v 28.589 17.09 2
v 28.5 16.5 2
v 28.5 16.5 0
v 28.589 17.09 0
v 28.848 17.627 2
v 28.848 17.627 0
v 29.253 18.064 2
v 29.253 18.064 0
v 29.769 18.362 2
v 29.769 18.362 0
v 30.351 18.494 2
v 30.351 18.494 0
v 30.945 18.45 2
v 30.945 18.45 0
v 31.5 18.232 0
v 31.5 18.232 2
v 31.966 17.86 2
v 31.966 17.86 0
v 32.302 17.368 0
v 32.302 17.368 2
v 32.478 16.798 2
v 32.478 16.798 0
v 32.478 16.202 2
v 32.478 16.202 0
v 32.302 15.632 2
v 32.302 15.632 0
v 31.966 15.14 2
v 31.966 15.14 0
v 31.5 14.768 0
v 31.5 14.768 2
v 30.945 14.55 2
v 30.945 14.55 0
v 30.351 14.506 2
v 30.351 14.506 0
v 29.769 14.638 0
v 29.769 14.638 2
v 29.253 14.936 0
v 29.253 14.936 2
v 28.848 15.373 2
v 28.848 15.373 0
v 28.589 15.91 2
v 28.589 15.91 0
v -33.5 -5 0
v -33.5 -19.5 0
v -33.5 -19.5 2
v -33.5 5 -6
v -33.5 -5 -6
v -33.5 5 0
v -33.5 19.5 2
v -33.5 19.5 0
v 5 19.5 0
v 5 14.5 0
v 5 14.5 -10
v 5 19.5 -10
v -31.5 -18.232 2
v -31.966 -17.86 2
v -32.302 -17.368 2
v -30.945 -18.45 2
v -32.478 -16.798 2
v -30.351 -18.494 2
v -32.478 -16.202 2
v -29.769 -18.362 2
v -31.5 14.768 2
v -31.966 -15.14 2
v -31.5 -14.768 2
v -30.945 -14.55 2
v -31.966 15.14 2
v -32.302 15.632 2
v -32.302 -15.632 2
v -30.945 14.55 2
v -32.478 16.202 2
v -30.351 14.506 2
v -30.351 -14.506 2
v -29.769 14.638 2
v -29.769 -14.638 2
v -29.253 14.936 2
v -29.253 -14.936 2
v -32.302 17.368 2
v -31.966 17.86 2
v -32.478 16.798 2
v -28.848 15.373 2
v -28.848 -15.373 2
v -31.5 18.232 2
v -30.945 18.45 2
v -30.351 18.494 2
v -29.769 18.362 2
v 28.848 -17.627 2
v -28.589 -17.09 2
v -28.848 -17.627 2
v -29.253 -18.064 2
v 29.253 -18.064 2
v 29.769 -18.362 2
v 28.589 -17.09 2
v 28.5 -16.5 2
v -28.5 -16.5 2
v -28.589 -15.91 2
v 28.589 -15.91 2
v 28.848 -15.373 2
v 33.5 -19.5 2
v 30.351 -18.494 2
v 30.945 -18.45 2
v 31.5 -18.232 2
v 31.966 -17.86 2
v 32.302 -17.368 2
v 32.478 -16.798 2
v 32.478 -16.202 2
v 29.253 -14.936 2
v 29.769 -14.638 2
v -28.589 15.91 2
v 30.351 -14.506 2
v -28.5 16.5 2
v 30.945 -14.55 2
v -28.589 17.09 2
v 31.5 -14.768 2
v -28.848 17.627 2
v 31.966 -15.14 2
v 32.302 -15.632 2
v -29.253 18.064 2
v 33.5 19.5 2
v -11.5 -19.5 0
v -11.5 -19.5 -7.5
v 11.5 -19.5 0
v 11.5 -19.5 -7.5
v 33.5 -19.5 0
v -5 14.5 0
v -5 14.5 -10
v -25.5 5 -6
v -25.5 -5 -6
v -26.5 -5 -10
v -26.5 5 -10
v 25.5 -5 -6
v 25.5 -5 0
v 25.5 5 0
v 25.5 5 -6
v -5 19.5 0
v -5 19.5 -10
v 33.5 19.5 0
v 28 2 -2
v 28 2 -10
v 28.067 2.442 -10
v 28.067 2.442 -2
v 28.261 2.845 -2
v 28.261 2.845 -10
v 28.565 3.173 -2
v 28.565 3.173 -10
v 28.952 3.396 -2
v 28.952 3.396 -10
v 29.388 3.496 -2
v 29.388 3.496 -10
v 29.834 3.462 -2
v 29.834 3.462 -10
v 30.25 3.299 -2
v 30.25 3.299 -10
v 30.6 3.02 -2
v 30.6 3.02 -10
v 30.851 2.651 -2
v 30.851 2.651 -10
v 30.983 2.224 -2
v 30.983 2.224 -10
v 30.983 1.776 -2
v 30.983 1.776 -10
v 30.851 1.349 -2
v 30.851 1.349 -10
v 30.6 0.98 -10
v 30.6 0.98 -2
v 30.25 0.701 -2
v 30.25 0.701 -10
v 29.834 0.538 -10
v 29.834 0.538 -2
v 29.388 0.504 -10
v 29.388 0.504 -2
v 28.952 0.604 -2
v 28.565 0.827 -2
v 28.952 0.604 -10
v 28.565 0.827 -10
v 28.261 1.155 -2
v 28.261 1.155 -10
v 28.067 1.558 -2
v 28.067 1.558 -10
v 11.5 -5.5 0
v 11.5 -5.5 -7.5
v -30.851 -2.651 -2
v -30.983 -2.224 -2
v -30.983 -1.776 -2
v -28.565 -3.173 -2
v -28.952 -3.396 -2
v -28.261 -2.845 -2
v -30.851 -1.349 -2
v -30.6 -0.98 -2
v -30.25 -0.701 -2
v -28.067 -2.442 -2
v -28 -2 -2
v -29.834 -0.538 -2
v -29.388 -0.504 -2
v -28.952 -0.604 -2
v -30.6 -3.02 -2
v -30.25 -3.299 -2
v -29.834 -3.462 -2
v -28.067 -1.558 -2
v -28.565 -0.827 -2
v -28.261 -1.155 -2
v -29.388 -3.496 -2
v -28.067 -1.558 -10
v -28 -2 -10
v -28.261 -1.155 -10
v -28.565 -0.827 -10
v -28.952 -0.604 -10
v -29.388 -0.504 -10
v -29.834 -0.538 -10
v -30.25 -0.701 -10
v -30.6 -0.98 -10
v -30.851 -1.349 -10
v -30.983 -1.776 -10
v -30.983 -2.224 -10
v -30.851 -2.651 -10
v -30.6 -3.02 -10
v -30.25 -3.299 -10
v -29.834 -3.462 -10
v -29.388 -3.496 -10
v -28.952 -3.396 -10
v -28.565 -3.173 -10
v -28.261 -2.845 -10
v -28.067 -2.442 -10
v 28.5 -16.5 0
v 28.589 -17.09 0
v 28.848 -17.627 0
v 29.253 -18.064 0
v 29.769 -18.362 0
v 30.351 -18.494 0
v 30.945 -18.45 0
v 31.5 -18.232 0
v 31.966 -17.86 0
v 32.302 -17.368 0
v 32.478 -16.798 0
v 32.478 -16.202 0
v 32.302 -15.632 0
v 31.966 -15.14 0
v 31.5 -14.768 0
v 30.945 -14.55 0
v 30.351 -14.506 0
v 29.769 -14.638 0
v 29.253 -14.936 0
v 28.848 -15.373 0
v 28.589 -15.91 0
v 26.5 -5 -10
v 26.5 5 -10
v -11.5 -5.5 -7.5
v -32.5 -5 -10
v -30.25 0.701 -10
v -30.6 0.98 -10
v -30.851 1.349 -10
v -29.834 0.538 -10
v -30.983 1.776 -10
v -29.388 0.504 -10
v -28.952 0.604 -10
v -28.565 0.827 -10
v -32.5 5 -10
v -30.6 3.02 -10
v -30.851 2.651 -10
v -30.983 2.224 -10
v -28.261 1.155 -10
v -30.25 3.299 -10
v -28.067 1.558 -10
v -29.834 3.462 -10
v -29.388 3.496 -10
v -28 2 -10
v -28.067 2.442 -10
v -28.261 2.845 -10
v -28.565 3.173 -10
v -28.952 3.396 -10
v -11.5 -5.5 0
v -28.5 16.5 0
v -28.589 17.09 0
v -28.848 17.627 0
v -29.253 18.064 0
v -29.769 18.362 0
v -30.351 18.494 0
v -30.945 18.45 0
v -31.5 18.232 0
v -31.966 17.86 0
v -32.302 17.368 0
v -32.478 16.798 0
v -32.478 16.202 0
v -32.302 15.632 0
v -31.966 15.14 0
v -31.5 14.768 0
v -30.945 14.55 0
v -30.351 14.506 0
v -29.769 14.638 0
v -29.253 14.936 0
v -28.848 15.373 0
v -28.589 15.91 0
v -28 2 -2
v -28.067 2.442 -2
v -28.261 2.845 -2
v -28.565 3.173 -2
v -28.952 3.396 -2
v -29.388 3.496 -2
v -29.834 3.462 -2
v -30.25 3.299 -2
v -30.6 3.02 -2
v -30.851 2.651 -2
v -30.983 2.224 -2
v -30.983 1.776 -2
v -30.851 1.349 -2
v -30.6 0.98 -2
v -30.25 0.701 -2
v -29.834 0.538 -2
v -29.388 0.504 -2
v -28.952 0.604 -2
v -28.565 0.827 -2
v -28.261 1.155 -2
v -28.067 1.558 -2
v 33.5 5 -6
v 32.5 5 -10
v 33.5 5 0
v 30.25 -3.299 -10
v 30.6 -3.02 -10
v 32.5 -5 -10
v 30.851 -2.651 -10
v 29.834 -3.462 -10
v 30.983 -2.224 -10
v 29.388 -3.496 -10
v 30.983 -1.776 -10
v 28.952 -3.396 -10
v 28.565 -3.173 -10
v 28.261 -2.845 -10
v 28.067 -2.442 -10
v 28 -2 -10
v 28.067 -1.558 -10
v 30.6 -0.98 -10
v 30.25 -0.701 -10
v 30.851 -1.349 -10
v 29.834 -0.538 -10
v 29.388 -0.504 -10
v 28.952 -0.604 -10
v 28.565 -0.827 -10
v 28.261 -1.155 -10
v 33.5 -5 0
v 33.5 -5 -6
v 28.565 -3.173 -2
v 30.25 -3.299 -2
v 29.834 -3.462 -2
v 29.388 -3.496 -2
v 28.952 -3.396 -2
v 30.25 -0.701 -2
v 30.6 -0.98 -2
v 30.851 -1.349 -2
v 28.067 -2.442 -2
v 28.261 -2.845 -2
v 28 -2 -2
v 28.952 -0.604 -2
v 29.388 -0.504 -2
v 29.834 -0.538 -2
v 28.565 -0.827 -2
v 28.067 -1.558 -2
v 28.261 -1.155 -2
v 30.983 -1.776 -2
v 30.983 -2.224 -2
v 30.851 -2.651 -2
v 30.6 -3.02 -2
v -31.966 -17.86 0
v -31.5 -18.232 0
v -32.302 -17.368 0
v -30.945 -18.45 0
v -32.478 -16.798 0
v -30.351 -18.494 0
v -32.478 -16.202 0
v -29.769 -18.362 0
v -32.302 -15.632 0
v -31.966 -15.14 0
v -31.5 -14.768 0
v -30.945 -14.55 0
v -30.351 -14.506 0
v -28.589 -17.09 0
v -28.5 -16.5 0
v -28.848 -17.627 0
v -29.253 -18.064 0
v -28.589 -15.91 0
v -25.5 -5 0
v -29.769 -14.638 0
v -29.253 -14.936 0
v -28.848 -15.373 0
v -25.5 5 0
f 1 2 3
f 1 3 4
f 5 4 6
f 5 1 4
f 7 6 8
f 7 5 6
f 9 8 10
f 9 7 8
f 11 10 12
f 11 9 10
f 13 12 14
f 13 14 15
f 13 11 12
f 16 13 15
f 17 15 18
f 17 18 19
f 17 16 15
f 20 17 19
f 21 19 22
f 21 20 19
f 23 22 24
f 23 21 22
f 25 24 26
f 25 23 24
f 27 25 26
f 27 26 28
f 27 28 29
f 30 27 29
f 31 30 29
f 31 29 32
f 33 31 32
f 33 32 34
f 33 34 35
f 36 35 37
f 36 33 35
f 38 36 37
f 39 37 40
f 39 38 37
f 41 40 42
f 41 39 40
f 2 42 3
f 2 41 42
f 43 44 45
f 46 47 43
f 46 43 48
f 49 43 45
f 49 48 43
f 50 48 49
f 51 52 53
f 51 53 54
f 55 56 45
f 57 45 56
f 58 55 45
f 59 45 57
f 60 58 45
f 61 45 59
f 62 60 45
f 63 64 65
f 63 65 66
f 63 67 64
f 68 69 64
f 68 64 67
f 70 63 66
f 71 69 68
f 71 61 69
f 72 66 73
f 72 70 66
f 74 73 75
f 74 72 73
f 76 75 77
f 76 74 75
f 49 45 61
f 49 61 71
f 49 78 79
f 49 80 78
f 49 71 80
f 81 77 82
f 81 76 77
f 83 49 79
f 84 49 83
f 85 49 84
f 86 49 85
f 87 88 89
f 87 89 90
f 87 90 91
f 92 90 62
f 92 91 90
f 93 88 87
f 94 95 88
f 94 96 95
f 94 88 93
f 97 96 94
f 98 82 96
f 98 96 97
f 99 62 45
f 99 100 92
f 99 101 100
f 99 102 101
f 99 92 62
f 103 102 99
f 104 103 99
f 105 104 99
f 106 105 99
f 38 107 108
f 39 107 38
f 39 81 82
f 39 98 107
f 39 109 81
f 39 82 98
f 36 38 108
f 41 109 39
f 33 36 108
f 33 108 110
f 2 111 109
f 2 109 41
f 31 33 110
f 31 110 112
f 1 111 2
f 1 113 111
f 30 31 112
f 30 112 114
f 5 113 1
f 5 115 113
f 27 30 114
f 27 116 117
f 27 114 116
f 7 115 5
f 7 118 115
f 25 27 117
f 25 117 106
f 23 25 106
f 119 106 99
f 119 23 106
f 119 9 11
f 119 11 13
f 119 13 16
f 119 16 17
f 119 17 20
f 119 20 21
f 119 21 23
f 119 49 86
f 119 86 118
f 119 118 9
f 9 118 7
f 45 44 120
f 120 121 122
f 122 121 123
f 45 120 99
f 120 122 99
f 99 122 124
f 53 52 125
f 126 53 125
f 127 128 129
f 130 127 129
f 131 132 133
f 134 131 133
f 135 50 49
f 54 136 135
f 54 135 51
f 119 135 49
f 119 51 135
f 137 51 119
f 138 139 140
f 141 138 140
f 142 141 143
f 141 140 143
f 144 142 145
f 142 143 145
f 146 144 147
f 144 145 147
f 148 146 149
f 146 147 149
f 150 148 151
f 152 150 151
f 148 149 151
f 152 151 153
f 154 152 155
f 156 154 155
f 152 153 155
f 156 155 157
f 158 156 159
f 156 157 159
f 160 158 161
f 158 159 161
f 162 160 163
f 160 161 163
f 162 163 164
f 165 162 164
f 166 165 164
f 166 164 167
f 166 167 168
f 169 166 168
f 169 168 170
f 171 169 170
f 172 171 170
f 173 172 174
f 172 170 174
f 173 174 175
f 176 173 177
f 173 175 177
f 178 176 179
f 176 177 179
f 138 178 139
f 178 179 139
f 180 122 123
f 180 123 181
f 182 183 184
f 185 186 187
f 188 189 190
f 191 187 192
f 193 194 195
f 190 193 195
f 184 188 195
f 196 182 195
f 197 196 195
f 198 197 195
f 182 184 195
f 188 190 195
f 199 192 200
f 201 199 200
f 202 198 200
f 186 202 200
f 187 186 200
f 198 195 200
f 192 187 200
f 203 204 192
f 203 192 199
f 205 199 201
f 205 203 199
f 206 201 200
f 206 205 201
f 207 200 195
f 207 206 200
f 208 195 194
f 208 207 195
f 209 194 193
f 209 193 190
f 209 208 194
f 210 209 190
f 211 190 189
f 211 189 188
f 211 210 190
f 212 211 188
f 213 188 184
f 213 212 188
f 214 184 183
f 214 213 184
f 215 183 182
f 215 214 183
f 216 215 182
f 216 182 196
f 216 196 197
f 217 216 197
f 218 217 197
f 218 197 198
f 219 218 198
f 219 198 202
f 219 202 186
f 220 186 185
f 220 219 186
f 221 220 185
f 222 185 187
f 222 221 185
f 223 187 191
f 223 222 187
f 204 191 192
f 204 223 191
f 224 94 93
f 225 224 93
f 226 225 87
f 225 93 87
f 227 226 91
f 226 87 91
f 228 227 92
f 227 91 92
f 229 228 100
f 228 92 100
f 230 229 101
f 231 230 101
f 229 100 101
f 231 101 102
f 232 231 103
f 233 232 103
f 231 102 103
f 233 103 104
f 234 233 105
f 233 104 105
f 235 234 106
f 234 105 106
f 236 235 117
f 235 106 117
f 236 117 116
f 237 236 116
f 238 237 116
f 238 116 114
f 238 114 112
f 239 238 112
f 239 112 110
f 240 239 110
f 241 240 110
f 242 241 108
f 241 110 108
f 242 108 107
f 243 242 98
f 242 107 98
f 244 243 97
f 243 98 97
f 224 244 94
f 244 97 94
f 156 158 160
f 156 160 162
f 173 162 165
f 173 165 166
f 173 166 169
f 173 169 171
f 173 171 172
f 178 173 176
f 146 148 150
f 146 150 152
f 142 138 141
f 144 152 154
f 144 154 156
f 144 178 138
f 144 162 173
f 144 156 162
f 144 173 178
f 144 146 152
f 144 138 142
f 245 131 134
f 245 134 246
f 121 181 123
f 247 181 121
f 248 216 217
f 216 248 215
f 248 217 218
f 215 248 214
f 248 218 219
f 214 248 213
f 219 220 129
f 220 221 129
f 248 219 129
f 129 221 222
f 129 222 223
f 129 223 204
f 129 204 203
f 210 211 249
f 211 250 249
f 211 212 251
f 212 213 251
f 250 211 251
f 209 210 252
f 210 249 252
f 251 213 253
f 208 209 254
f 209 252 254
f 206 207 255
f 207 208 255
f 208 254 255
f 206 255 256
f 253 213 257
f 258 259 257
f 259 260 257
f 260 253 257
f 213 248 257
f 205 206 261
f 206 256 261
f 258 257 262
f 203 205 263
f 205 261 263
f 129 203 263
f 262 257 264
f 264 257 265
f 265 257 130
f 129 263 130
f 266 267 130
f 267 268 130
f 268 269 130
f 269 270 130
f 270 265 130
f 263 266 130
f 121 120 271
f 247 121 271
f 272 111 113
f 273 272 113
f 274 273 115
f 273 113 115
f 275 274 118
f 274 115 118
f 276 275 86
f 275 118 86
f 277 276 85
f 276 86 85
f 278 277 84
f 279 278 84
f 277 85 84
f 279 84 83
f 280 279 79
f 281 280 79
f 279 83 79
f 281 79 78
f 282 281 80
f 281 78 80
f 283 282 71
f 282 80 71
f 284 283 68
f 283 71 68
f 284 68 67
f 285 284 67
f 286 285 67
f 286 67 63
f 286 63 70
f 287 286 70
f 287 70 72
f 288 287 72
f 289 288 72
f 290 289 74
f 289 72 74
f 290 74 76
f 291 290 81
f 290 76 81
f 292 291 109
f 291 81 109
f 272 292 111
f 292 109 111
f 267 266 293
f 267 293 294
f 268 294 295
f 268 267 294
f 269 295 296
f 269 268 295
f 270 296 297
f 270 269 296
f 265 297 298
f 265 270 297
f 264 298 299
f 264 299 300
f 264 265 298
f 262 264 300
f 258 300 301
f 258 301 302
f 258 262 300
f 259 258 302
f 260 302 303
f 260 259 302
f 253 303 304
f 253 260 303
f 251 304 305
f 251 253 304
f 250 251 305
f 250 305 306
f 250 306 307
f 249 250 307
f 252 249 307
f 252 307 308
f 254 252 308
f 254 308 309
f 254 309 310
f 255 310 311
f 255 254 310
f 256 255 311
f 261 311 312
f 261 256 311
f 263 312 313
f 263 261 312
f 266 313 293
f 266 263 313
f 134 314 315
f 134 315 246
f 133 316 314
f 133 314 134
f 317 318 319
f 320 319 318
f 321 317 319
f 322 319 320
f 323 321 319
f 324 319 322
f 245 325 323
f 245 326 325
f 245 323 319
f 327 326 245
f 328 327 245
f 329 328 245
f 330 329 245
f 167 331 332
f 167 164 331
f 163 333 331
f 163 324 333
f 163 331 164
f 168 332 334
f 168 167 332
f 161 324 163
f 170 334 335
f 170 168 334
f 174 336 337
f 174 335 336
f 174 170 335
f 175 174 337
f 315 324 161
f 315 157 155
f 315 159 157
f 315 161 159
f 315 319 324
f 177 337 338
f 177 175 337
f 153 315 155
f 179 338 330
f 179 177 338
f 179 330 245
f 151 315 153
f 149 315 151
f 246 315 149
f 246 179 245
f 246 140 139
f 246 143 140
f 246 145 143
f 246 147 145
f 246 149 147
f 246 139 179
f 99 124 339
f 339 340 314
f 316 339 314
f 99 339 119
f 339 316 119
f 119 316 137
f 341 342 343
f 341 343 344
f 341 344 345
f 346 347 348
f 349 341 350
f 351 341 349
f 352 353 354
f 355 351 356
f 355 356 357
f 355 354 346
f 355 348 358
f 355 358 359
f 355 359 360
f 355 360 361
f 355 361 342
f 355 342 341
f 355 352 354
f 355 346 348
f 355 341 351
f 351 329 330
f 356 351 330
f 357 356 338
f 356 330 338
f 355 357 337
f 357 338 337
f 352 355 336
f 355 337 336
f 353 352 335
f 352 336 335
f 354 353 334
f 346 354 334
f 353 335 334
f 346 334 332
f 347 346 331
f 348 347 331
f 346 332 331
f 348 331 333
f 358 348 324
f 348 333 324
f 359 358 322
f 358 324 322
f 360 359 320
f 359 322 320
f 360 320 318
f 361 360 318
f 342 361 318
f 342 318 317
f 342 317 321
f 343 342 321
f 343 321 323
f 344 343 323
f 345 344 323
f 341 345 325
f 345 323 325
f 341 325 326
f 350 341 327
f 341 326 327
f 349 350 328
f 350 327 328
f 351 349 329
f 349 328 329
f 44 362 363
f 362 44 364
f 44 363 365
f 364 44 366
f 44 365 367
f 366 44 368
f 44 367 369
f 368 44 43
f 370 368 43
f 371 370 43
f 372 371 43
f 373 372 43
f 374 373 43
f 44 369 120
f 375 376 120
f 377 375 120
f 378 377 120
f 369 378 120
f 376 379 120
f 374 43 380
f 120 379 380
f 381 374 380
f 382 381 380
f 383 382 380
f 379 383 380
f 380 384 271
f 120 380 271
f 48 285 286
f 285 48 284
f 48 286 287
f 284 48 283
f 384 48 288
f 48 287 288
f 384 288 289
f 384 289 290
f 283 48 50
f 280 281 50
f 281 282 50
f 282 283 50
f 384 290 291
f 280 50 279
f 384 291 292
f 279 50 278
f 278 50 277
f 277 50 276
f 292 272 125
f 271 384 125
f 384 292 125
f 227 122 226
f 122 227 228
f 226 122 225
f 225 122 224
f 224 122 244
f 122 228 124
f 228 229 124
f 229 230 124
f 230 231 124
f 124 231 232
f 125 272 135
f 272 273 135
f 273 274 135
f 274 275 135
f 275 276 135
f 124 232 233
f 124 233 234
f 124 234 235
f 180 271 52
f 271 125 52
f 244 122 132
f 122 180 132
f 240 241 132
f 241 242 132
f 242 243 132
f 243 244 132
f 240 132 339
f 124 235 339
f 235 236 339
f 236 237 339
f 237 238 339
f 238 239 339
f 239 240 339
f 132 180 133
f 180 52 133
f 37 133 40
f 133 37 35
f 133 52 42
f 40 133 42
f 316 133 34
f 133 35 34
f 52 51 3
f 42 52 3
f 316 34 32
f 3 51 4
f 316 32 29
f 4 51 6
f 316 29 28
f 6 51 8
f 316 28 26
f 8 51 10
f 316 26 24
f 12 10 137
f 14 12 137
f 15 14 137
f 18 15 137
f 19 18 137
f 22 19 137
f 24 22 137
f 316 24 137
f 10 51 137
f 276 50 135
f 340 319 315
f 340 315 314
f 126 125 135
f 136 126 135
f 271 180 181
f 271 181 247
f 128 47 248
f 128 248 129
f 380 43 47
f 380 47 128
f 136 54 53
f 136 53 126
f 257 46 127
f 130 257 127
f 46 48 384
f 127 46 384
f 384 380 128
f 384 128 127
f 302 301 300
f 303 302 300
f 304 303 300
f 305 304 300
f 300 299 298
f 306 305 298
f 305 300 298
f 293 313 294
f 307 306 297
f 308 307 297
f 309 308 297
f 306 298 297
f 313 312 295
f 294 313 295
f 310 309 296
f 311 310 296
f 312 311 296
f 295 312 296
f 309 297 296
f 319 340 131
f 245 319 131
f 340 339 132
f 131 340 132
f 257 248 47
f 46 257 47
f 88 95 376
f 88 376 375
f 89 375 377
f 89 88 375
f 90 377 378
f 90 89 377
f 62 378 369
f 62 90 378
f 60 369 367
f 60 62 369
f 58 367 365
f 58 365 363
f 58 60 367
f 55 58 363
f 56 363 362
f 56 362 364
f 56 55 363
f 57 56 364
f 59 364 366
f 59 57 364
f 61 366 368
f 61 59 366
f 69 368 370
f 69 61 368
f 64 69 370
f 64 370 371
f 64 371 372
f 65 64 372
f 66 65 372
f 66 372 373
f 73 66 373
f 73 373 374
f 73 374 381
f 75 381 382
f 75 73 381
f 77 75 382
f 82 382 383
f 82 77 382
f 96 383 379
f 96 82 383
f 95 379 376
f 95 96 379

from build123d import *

# Parameters (mm, degrees)
SKETCH_1_W               = 67
SKETCH_1_H               = 39
EXTRUDE_1_DEPTH          = 2
SKETCH_2_R               = 2
CUT_EXTRUDE_1_DEPTH      = 2
MIRROR_2_COPY_1_SKETCH_R = 2
MIRROR_2_COPY_1_DEPTH    = 2
SKETCH_3_W               = 8
SKETCH_3_H               = 10
EXTRUDE_2_DEPTH          = 10
CUT_EXTRUDE_2_DEPTH      = 10
SKETCH_5_R               = 1.5
CUT_EXTRUDE_3_DEPTH      = 8
SKETCH_6_W               = 10
SKETCH_6_H               = 5
EXTRUDE_3_DEPTH          = 10
SKETCH_10_W              = 23
SKETCH_10_H              = 14
EXTRUDE_4_DEPTH          = 7.5


with BuildPart() as part:
    # 草图1 → 凸台-拉伸1 (new body)
    with BuildSketch(Plane.XY):
        Rectangle(SKETCH_1_W, SKETCH_1_H)
    extrude(amount=EXTRUDE_1_DEPTH)

    # 草图2 → 切除-拉伸1 (cut)
    with BuildSketch(Plane.XY.offset(2)):
        with Locations((-30.5, 16.5)):
            Circle(SKETCH_2_R)
    cut_extrude_1 = extrude(amount=-CUT_EXTRUDE_1_DEPTH, mode=Mode.SUBTRACT)

    # 镜向1: 切除-拉伸1 across plane
    add(cut_extrude_1.mirror(Plane(origin=(0, 0, 0), x_dir=(0, 0, 1), z_dir=(1, 0, 0))), mode=Mode.SUBTRACT)

    # 镜向2: 切除-拉伸1 across plane
    add(cut_extrude_1.mirror(Plane.ZX), mode=Mode.SUBTRACT)

    # 镜向2 copy 1 sketch → 镜向2 copy 1 (cut)
    with BuildSketch(Plane(origin=(0, 0, 2), x_dir=(-1, 0, 0), z_dir=(0, 0, 1))):
        with Locations((-30.5, 16.5)):
            Circle(MIRROR_2_COPY_1_SKETCH_R)
    extrude(amount=-MIRROR_2_COPY_1_DEPTH, mode=Mode.SUBTRACT)

    # 草图3 → 凸台-拉伸2 (add)
    with BuildSketch(Plane(origin=(0, 0, 0), x_dir=(-1, 0, 0), z_dir=(0, 0, -1))):
        with Locations((-29.5, 0)):
            Rectangle(SKETCH_3_W, SKETCH_3_H)
    extrude_2 = extrude(amount=EXTRUDE_2_DEPTH)

    # 草图4 → 切除-拉伸2 (cut)
    with BuildSketch(Plane.XZ.offset(5)):
        Polygon((32.5, -10), (33.5, -6), (33.5, -10), align=None)
        Polygon((25.5, -10), (25.5, -6), (26.5, -10), align=None)
    cut_extrude_2 = extrude(amount=-CUT_EXTRUDE_2_DEPTH, mode=Mode.SUBTRACT)

    # 草图5 → 切除-拉伸3 (cut)
    with BuildSketch(Plane(origin=(0, 0, -10), x_dir=(-1, 0, 0), z_dir=(0, 0, -1))):
        with Locations((-29.5, 2)):
            Circle(SKETCH_5_R)
        with Locations((-29.5, -2)):
            Circle(SKETCH_5_R)
    cut_extrude_3 = extrude(amount=-CUT_EXTRUDE_3_DEPTH, mode=Mode.SUBTRACT)

    # 镜向3: 凸台-拉伸2, 切除-拉伸2, 切除-拉伸3 across plane
    add(extrude_2.mirror(Plane(origin=(0, 0, 0), x_dir=(0, 0, 1), z_dir=(1, 0, 0))))
    add(cut_extrude_2.mirror(Plane(origin=(0, 0, 0), x_dir=(0, 0, 1), z_dir=(1, 0, 0))), mode=Mode.SUBTRACT)
    add(cut_extrude_3.mirror(Plane(origin=(0, 0, 0), x_dir=(0, 0, 1), z_dir=(1, 0, 0))), mode=Mode.SUBTRACT)

    # 草图6 → 凸台-拉伸3 (add)
    with BuildSketch(Plane(origin=(0, 0, 0), x_dir=(-1, 0, 0), z_dir=(0, 0, -1))):
        with Locations((0, 17)):
            Rectangle(SKETCH_6_W, SKETCH_6_H)
    extrude(amount=EXTRUDE_3_DEPTH)

    # 草图10 → 凸台-拉伸4 (add)
    with BuildSketch(Plane(origin=(0, 0, 0), x_dir=(-1, 0, 0), z_dir=(0, 0, -1))):
        with Locations((0, -12.5)):
            Rectangle(SKETCH_10_W, SKETCH_10_H)
    extrude(amount=EXTRUDE_4_DEPTH)


solid = part.part
